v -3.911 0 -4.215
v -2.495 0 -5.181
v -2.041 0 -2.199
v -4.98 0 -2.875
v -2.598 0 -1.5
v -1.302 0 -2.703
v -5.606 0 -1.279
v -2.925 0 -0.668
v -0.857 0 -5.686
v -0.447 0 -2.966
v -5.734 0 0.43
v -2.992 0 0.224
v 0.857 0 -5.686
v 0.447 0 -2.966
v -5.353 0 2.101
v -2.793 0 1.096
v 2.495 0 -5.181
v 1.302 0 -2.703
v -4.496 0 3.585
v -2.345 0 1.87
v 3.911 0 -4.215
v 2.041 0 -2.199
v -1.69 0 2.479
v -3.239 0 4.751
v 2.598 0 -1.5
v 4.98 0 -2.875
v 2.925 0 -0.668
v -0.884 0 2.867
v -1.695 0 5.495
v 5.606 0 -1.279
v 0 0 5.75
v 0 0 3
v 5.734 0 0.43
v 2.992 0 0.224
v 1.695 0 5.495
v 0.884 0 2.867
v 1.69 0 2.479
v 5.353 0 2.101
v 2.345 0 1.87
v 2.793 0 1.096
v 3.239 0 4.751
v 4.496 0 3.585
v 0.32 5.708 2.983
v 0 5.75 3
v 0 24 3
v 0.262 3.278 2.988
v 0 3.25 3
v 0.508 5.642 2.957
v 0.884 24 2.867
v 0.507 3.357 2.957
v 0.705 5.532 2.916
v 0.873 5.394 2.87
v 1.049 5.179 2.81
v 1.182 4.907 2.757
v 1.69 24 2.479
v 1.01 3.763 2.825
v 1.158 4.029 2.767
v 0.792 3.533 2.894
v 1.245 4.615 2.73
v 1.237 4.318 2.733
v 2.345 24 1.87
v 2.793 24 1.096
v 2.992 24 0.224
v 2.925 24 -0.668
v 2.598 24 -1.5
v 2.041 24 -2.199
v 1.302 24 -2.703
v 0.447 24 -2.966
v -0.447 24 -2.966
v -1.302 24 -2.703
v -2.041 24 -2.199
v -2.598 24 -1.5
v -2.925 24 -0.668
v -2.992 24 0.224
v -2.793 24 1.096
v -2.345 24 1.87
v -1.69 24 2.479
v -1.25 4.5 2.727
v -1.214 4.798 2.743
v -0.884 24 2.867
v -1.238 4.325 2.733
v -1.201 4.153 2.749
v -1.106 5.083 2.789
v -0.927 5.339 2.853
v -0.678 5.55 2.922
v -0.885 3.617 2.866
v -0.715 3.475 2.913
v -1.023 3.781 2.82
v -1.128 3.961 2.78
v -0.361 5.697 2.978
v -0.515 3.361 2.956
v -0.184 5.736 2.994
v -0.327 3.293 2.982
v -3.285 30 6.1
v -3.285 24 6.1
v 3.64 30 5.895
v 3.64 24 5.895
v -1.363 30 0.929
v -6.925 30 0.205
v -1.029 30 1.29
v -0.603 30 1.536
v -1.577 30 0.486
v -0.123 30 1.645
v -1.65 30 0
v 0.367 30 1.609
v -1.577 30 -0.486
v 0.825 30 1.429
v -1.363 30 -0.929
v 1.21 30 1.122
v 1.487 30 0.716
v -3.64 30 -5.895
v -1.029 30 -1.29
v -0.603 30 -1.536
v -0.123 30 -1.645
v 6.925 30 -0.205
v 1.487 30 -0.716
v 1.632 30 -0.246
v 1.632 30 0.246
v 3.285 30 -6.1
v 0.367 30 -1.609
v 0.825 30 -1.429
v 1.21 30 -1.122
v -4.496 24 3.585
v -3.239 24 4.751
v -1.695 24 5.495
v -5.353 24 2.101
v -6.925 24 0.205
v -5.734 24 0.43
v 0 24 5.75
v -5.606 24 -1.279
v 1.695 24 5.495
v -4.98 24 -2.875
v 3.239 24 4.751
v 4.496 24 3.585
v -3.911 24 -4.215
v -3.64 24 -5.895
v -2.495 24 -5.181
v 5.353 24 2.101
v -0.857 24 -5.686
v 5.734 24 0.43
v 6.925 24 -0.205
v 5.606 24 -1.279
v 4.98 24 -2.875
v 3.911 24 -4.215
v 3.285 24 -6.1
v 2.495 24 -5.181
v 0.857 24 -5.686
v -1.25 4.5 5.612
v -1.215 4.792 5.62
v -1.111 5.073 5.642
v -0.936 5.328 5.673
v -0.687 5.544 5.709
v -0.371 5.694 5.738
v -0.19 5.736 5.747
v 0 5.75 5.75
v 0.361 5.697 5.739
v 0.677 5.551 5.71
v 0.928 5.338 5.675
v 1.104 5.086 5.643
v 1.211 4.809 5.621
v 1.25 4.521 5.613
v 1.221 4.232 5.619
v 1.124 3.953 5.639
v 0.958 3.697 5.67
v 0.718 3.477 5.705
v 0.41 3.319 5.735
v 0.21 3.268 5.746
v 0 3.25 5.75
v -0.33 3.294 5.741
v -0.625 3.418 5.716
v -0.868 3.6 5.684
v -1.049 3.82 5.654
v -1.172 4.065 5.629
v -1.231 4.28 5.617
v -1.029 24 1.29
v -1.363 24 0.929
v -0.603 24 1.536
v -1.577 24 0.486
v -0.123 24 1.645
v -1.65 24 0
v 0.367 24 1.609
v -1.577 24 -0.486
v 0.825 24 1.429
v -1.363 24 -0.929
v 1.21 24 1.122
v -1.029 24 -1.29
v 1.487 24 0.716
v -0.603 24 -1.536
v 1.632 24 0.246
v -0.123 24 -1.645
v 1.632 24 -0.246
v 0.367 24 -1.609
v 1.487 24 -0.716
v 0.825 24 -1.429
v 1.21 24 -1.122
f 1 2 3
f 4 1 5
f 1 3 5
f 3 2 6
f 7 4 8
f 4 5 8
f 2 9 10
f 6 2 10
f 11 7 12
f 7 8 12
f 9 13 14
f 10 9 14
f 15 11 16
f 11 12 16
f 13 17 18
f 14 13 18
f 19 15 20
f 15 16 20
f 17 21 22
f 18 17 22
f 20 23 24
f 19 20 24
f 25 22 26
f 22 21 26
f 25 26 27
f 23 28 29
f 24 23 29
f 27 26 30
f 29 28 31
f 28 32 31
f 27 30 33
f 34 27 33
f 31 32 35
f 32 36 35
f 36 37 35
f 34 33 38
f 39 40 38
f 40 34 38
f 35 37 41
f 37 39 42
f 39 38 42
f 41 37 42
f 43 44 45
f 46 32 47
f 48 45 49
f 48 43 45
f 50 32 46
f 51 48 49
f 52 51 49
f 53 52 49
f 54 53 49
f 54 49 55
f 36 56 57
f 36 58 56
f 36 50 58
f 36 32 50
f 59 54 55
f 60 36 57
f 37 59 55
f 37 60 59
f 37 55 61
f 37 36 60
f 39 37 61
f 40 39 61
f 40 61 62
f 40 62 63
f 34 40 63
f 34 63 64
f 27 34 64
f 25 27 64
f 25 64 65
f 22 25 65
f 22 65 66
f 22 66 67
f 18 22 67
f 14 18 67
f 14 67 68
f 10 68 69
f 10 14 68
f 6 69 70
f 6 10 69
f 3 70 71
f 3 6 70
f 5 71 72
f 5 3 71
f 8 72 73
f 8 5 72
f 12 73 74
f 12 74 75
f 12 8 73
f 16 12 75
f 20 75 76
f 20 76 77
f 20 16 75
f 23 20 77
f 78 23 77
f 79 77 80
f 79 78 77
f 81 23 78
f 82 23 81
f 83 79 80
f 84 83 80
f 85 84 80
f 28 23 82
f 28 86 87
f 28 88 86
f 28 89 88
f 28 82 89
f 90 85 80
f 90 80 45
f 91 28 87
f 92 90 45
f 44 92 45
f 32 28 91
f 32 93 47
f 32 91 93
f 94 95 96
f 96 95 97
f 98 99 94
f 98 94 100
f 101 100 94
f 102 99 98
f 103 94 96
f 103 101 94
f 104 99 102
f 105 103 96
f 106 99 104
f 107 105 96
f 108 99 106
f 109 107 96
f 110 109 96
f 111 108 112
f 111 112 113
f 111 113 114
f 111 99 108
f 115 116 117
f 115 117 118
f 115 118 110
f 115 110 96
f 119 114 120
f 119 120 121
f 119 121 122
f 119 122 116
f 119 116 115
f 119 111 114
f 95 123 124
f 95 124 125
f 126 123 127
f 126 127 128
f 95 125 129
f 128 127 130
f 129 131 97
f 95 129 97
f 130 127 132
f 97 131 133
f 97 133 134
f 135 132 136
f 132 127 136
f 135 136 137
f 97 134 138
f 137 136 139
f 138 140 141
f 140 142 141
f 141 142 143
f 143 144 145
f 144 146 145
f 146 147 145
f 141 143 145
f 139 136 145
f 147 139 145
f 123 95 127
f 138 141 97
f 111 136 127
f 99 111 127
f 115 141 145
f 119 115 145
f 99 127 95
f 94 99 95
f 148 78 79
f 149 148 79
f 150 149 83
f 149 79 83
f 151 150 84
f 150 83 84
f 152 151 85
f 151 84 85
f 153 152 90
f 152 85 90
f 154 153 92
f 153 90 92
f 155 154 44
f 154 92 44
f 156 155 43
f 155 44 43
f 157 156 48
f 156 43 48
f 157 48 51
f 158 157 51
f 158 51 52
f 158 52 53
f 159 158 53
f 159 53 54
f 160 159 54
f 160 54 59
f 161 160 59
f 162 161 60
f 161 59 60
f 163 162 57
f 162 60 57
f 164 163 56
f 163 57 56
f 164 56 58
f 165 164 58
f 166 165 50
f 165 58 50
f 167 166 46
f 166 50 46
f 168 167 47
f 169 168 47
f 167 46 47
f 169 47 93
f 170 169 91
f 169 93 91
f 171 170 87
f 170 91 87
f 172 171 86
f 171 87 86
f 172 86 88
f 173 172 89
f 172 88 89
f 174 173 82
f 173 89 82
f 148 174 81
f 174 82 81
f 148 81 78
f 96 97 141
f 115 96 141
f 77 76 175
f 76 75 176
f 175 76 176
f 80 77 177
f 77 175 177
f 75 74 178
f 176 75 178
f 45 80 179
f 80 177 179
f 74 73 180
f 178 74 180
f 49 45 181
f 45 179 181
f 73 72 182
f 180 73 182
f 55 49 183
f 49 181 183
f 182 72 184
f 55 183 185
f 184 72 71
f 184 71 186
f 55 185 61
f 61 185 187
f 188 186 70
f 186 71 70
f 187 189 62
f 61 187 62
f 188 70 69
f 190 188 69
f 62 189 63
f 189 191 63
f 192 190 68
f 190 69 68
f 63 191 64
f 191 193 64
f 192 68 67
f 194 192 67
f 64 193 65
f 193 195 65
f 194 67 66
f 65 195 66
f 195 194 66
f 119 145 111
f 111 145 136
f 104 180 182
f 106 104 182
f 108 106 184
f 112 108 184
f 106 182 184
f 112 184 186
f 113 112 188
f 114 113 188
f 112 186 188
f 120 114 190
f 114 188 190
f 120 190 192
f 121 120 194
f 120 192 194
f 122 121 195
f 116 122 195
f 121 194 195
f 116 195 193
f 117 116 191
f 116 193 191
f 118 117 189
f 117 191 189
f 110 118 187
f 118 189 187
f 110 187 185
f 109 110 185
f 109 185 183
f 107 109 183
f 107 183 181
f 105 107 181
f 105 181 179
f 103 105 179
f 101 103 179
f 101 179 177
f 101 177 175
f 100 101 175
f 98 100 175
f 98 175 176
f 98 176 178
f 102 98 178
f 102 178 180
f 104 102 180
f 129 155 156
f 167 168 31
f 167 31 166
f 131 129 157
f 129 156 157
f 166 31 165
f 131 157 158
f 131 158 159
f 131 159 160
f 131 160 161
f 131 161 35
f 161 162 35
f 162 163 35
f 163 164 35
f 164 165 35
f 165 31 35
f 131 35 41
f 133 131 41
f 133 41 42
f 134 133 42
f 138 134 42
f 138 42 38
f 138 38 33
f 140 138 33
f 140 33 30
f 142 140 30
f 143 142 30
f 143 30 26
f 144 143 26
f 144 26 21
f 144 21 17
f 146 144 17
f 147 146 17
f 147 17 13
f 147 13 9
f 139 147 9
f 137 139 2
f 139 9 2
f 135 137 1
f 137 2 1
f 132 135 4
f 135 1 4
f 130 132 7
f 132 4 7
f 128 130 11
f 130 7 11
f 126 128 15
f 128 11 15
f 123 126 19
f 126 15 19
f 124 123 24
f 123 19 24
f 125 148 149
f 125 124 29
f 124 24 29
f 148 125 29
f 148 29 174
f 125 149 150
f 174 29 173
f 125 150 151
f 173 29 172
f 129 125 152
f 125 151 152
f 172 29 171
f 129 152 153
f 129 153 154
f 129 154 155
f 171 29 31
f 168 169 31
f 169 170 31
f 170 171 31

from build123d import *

# Parameters (mm, degrees)
SKETCH_1_R             = 5.75
SKETCH_1_R_2           = 3
EXTRUDE_1_DEPTH        = 24
HOLE_WIZARD_M3_1_D     = 2.5
HOLE_WIZARD_M3_1_DEPTH = 7.748924226
HOLE_WIZARD_M3_1_TIP   = 0.751075774
EXTRUDE_2_DEPTH        = 6
HOLE_WIZARD_M4_1_D     = 3.3


with BuildPart() as part:
    # 草图1 → 凸台-拉伸1 (new body)
    with BuildSketch(Plane(origin=(0, 0, 0), x_dir=(1, 0, 0), z_dir=(0, 1, 0))):
        with Locations(Location((0, 0, 0), (0, 0, 270))):
            Circle(SKETCH_1_R)
        with Locations(Location((0, 0, 0), (0, 0, 270))):
            Circle(SKETCH_1_R_2, mode=Mode.SUBTRACT)
    extrude(amount=EXTRUDE_1_DEPTH)

    # M3 螺纹孔1
    with Locations(Plane.XY.offset(5.75)):
        with Locations((0, 4.5)):
            Hole(HOLE_WIZARD_M3_1_D / 2, depth=HOLE_WIZARD_M3_1_DEPTH)
            with Locations((0, 0, -(HOLE_WIZARD_M3_1_DEPTH + HOLE_WIZARD_M3_1_TIP / 2))):  # 118° drill point
                Cone(0, HOLE_WIZARD_M3_1_D / 2, HOLE_WIZARD_M3_1_TIP, mode=Mode.SUBTRACT)

    # 草图11 → 凸台-拉伸2 (add)
    with BuildSketch(Plane(origin=(0, 24, 0), x_dir=(1, 0, 0), z_dir=(0, 1, 0))):
        Polygon((6.925181727, 0.204592398), (3.28540865, 6.0996795), (-3.639773077, 5.895087103), (-6.925181727, -0.204592398), (-3.28540865, -6.0996795), (3.639773077, -5.895087103), align=None)
    extrude(amount=EXTRUDE_2_DEPTH)

    # M4 螺纹孔的螺纹孔钻头1 (through all)
    with Locations(Plane(origin=(0, 30, 0), x_dir=(1, 0, 0), z_dir=(0, 1, 0))):
        with Locations((0, 0)):
            Hole(HOLE_WIZARD_M4_1_D / 2)


solid = part.part
